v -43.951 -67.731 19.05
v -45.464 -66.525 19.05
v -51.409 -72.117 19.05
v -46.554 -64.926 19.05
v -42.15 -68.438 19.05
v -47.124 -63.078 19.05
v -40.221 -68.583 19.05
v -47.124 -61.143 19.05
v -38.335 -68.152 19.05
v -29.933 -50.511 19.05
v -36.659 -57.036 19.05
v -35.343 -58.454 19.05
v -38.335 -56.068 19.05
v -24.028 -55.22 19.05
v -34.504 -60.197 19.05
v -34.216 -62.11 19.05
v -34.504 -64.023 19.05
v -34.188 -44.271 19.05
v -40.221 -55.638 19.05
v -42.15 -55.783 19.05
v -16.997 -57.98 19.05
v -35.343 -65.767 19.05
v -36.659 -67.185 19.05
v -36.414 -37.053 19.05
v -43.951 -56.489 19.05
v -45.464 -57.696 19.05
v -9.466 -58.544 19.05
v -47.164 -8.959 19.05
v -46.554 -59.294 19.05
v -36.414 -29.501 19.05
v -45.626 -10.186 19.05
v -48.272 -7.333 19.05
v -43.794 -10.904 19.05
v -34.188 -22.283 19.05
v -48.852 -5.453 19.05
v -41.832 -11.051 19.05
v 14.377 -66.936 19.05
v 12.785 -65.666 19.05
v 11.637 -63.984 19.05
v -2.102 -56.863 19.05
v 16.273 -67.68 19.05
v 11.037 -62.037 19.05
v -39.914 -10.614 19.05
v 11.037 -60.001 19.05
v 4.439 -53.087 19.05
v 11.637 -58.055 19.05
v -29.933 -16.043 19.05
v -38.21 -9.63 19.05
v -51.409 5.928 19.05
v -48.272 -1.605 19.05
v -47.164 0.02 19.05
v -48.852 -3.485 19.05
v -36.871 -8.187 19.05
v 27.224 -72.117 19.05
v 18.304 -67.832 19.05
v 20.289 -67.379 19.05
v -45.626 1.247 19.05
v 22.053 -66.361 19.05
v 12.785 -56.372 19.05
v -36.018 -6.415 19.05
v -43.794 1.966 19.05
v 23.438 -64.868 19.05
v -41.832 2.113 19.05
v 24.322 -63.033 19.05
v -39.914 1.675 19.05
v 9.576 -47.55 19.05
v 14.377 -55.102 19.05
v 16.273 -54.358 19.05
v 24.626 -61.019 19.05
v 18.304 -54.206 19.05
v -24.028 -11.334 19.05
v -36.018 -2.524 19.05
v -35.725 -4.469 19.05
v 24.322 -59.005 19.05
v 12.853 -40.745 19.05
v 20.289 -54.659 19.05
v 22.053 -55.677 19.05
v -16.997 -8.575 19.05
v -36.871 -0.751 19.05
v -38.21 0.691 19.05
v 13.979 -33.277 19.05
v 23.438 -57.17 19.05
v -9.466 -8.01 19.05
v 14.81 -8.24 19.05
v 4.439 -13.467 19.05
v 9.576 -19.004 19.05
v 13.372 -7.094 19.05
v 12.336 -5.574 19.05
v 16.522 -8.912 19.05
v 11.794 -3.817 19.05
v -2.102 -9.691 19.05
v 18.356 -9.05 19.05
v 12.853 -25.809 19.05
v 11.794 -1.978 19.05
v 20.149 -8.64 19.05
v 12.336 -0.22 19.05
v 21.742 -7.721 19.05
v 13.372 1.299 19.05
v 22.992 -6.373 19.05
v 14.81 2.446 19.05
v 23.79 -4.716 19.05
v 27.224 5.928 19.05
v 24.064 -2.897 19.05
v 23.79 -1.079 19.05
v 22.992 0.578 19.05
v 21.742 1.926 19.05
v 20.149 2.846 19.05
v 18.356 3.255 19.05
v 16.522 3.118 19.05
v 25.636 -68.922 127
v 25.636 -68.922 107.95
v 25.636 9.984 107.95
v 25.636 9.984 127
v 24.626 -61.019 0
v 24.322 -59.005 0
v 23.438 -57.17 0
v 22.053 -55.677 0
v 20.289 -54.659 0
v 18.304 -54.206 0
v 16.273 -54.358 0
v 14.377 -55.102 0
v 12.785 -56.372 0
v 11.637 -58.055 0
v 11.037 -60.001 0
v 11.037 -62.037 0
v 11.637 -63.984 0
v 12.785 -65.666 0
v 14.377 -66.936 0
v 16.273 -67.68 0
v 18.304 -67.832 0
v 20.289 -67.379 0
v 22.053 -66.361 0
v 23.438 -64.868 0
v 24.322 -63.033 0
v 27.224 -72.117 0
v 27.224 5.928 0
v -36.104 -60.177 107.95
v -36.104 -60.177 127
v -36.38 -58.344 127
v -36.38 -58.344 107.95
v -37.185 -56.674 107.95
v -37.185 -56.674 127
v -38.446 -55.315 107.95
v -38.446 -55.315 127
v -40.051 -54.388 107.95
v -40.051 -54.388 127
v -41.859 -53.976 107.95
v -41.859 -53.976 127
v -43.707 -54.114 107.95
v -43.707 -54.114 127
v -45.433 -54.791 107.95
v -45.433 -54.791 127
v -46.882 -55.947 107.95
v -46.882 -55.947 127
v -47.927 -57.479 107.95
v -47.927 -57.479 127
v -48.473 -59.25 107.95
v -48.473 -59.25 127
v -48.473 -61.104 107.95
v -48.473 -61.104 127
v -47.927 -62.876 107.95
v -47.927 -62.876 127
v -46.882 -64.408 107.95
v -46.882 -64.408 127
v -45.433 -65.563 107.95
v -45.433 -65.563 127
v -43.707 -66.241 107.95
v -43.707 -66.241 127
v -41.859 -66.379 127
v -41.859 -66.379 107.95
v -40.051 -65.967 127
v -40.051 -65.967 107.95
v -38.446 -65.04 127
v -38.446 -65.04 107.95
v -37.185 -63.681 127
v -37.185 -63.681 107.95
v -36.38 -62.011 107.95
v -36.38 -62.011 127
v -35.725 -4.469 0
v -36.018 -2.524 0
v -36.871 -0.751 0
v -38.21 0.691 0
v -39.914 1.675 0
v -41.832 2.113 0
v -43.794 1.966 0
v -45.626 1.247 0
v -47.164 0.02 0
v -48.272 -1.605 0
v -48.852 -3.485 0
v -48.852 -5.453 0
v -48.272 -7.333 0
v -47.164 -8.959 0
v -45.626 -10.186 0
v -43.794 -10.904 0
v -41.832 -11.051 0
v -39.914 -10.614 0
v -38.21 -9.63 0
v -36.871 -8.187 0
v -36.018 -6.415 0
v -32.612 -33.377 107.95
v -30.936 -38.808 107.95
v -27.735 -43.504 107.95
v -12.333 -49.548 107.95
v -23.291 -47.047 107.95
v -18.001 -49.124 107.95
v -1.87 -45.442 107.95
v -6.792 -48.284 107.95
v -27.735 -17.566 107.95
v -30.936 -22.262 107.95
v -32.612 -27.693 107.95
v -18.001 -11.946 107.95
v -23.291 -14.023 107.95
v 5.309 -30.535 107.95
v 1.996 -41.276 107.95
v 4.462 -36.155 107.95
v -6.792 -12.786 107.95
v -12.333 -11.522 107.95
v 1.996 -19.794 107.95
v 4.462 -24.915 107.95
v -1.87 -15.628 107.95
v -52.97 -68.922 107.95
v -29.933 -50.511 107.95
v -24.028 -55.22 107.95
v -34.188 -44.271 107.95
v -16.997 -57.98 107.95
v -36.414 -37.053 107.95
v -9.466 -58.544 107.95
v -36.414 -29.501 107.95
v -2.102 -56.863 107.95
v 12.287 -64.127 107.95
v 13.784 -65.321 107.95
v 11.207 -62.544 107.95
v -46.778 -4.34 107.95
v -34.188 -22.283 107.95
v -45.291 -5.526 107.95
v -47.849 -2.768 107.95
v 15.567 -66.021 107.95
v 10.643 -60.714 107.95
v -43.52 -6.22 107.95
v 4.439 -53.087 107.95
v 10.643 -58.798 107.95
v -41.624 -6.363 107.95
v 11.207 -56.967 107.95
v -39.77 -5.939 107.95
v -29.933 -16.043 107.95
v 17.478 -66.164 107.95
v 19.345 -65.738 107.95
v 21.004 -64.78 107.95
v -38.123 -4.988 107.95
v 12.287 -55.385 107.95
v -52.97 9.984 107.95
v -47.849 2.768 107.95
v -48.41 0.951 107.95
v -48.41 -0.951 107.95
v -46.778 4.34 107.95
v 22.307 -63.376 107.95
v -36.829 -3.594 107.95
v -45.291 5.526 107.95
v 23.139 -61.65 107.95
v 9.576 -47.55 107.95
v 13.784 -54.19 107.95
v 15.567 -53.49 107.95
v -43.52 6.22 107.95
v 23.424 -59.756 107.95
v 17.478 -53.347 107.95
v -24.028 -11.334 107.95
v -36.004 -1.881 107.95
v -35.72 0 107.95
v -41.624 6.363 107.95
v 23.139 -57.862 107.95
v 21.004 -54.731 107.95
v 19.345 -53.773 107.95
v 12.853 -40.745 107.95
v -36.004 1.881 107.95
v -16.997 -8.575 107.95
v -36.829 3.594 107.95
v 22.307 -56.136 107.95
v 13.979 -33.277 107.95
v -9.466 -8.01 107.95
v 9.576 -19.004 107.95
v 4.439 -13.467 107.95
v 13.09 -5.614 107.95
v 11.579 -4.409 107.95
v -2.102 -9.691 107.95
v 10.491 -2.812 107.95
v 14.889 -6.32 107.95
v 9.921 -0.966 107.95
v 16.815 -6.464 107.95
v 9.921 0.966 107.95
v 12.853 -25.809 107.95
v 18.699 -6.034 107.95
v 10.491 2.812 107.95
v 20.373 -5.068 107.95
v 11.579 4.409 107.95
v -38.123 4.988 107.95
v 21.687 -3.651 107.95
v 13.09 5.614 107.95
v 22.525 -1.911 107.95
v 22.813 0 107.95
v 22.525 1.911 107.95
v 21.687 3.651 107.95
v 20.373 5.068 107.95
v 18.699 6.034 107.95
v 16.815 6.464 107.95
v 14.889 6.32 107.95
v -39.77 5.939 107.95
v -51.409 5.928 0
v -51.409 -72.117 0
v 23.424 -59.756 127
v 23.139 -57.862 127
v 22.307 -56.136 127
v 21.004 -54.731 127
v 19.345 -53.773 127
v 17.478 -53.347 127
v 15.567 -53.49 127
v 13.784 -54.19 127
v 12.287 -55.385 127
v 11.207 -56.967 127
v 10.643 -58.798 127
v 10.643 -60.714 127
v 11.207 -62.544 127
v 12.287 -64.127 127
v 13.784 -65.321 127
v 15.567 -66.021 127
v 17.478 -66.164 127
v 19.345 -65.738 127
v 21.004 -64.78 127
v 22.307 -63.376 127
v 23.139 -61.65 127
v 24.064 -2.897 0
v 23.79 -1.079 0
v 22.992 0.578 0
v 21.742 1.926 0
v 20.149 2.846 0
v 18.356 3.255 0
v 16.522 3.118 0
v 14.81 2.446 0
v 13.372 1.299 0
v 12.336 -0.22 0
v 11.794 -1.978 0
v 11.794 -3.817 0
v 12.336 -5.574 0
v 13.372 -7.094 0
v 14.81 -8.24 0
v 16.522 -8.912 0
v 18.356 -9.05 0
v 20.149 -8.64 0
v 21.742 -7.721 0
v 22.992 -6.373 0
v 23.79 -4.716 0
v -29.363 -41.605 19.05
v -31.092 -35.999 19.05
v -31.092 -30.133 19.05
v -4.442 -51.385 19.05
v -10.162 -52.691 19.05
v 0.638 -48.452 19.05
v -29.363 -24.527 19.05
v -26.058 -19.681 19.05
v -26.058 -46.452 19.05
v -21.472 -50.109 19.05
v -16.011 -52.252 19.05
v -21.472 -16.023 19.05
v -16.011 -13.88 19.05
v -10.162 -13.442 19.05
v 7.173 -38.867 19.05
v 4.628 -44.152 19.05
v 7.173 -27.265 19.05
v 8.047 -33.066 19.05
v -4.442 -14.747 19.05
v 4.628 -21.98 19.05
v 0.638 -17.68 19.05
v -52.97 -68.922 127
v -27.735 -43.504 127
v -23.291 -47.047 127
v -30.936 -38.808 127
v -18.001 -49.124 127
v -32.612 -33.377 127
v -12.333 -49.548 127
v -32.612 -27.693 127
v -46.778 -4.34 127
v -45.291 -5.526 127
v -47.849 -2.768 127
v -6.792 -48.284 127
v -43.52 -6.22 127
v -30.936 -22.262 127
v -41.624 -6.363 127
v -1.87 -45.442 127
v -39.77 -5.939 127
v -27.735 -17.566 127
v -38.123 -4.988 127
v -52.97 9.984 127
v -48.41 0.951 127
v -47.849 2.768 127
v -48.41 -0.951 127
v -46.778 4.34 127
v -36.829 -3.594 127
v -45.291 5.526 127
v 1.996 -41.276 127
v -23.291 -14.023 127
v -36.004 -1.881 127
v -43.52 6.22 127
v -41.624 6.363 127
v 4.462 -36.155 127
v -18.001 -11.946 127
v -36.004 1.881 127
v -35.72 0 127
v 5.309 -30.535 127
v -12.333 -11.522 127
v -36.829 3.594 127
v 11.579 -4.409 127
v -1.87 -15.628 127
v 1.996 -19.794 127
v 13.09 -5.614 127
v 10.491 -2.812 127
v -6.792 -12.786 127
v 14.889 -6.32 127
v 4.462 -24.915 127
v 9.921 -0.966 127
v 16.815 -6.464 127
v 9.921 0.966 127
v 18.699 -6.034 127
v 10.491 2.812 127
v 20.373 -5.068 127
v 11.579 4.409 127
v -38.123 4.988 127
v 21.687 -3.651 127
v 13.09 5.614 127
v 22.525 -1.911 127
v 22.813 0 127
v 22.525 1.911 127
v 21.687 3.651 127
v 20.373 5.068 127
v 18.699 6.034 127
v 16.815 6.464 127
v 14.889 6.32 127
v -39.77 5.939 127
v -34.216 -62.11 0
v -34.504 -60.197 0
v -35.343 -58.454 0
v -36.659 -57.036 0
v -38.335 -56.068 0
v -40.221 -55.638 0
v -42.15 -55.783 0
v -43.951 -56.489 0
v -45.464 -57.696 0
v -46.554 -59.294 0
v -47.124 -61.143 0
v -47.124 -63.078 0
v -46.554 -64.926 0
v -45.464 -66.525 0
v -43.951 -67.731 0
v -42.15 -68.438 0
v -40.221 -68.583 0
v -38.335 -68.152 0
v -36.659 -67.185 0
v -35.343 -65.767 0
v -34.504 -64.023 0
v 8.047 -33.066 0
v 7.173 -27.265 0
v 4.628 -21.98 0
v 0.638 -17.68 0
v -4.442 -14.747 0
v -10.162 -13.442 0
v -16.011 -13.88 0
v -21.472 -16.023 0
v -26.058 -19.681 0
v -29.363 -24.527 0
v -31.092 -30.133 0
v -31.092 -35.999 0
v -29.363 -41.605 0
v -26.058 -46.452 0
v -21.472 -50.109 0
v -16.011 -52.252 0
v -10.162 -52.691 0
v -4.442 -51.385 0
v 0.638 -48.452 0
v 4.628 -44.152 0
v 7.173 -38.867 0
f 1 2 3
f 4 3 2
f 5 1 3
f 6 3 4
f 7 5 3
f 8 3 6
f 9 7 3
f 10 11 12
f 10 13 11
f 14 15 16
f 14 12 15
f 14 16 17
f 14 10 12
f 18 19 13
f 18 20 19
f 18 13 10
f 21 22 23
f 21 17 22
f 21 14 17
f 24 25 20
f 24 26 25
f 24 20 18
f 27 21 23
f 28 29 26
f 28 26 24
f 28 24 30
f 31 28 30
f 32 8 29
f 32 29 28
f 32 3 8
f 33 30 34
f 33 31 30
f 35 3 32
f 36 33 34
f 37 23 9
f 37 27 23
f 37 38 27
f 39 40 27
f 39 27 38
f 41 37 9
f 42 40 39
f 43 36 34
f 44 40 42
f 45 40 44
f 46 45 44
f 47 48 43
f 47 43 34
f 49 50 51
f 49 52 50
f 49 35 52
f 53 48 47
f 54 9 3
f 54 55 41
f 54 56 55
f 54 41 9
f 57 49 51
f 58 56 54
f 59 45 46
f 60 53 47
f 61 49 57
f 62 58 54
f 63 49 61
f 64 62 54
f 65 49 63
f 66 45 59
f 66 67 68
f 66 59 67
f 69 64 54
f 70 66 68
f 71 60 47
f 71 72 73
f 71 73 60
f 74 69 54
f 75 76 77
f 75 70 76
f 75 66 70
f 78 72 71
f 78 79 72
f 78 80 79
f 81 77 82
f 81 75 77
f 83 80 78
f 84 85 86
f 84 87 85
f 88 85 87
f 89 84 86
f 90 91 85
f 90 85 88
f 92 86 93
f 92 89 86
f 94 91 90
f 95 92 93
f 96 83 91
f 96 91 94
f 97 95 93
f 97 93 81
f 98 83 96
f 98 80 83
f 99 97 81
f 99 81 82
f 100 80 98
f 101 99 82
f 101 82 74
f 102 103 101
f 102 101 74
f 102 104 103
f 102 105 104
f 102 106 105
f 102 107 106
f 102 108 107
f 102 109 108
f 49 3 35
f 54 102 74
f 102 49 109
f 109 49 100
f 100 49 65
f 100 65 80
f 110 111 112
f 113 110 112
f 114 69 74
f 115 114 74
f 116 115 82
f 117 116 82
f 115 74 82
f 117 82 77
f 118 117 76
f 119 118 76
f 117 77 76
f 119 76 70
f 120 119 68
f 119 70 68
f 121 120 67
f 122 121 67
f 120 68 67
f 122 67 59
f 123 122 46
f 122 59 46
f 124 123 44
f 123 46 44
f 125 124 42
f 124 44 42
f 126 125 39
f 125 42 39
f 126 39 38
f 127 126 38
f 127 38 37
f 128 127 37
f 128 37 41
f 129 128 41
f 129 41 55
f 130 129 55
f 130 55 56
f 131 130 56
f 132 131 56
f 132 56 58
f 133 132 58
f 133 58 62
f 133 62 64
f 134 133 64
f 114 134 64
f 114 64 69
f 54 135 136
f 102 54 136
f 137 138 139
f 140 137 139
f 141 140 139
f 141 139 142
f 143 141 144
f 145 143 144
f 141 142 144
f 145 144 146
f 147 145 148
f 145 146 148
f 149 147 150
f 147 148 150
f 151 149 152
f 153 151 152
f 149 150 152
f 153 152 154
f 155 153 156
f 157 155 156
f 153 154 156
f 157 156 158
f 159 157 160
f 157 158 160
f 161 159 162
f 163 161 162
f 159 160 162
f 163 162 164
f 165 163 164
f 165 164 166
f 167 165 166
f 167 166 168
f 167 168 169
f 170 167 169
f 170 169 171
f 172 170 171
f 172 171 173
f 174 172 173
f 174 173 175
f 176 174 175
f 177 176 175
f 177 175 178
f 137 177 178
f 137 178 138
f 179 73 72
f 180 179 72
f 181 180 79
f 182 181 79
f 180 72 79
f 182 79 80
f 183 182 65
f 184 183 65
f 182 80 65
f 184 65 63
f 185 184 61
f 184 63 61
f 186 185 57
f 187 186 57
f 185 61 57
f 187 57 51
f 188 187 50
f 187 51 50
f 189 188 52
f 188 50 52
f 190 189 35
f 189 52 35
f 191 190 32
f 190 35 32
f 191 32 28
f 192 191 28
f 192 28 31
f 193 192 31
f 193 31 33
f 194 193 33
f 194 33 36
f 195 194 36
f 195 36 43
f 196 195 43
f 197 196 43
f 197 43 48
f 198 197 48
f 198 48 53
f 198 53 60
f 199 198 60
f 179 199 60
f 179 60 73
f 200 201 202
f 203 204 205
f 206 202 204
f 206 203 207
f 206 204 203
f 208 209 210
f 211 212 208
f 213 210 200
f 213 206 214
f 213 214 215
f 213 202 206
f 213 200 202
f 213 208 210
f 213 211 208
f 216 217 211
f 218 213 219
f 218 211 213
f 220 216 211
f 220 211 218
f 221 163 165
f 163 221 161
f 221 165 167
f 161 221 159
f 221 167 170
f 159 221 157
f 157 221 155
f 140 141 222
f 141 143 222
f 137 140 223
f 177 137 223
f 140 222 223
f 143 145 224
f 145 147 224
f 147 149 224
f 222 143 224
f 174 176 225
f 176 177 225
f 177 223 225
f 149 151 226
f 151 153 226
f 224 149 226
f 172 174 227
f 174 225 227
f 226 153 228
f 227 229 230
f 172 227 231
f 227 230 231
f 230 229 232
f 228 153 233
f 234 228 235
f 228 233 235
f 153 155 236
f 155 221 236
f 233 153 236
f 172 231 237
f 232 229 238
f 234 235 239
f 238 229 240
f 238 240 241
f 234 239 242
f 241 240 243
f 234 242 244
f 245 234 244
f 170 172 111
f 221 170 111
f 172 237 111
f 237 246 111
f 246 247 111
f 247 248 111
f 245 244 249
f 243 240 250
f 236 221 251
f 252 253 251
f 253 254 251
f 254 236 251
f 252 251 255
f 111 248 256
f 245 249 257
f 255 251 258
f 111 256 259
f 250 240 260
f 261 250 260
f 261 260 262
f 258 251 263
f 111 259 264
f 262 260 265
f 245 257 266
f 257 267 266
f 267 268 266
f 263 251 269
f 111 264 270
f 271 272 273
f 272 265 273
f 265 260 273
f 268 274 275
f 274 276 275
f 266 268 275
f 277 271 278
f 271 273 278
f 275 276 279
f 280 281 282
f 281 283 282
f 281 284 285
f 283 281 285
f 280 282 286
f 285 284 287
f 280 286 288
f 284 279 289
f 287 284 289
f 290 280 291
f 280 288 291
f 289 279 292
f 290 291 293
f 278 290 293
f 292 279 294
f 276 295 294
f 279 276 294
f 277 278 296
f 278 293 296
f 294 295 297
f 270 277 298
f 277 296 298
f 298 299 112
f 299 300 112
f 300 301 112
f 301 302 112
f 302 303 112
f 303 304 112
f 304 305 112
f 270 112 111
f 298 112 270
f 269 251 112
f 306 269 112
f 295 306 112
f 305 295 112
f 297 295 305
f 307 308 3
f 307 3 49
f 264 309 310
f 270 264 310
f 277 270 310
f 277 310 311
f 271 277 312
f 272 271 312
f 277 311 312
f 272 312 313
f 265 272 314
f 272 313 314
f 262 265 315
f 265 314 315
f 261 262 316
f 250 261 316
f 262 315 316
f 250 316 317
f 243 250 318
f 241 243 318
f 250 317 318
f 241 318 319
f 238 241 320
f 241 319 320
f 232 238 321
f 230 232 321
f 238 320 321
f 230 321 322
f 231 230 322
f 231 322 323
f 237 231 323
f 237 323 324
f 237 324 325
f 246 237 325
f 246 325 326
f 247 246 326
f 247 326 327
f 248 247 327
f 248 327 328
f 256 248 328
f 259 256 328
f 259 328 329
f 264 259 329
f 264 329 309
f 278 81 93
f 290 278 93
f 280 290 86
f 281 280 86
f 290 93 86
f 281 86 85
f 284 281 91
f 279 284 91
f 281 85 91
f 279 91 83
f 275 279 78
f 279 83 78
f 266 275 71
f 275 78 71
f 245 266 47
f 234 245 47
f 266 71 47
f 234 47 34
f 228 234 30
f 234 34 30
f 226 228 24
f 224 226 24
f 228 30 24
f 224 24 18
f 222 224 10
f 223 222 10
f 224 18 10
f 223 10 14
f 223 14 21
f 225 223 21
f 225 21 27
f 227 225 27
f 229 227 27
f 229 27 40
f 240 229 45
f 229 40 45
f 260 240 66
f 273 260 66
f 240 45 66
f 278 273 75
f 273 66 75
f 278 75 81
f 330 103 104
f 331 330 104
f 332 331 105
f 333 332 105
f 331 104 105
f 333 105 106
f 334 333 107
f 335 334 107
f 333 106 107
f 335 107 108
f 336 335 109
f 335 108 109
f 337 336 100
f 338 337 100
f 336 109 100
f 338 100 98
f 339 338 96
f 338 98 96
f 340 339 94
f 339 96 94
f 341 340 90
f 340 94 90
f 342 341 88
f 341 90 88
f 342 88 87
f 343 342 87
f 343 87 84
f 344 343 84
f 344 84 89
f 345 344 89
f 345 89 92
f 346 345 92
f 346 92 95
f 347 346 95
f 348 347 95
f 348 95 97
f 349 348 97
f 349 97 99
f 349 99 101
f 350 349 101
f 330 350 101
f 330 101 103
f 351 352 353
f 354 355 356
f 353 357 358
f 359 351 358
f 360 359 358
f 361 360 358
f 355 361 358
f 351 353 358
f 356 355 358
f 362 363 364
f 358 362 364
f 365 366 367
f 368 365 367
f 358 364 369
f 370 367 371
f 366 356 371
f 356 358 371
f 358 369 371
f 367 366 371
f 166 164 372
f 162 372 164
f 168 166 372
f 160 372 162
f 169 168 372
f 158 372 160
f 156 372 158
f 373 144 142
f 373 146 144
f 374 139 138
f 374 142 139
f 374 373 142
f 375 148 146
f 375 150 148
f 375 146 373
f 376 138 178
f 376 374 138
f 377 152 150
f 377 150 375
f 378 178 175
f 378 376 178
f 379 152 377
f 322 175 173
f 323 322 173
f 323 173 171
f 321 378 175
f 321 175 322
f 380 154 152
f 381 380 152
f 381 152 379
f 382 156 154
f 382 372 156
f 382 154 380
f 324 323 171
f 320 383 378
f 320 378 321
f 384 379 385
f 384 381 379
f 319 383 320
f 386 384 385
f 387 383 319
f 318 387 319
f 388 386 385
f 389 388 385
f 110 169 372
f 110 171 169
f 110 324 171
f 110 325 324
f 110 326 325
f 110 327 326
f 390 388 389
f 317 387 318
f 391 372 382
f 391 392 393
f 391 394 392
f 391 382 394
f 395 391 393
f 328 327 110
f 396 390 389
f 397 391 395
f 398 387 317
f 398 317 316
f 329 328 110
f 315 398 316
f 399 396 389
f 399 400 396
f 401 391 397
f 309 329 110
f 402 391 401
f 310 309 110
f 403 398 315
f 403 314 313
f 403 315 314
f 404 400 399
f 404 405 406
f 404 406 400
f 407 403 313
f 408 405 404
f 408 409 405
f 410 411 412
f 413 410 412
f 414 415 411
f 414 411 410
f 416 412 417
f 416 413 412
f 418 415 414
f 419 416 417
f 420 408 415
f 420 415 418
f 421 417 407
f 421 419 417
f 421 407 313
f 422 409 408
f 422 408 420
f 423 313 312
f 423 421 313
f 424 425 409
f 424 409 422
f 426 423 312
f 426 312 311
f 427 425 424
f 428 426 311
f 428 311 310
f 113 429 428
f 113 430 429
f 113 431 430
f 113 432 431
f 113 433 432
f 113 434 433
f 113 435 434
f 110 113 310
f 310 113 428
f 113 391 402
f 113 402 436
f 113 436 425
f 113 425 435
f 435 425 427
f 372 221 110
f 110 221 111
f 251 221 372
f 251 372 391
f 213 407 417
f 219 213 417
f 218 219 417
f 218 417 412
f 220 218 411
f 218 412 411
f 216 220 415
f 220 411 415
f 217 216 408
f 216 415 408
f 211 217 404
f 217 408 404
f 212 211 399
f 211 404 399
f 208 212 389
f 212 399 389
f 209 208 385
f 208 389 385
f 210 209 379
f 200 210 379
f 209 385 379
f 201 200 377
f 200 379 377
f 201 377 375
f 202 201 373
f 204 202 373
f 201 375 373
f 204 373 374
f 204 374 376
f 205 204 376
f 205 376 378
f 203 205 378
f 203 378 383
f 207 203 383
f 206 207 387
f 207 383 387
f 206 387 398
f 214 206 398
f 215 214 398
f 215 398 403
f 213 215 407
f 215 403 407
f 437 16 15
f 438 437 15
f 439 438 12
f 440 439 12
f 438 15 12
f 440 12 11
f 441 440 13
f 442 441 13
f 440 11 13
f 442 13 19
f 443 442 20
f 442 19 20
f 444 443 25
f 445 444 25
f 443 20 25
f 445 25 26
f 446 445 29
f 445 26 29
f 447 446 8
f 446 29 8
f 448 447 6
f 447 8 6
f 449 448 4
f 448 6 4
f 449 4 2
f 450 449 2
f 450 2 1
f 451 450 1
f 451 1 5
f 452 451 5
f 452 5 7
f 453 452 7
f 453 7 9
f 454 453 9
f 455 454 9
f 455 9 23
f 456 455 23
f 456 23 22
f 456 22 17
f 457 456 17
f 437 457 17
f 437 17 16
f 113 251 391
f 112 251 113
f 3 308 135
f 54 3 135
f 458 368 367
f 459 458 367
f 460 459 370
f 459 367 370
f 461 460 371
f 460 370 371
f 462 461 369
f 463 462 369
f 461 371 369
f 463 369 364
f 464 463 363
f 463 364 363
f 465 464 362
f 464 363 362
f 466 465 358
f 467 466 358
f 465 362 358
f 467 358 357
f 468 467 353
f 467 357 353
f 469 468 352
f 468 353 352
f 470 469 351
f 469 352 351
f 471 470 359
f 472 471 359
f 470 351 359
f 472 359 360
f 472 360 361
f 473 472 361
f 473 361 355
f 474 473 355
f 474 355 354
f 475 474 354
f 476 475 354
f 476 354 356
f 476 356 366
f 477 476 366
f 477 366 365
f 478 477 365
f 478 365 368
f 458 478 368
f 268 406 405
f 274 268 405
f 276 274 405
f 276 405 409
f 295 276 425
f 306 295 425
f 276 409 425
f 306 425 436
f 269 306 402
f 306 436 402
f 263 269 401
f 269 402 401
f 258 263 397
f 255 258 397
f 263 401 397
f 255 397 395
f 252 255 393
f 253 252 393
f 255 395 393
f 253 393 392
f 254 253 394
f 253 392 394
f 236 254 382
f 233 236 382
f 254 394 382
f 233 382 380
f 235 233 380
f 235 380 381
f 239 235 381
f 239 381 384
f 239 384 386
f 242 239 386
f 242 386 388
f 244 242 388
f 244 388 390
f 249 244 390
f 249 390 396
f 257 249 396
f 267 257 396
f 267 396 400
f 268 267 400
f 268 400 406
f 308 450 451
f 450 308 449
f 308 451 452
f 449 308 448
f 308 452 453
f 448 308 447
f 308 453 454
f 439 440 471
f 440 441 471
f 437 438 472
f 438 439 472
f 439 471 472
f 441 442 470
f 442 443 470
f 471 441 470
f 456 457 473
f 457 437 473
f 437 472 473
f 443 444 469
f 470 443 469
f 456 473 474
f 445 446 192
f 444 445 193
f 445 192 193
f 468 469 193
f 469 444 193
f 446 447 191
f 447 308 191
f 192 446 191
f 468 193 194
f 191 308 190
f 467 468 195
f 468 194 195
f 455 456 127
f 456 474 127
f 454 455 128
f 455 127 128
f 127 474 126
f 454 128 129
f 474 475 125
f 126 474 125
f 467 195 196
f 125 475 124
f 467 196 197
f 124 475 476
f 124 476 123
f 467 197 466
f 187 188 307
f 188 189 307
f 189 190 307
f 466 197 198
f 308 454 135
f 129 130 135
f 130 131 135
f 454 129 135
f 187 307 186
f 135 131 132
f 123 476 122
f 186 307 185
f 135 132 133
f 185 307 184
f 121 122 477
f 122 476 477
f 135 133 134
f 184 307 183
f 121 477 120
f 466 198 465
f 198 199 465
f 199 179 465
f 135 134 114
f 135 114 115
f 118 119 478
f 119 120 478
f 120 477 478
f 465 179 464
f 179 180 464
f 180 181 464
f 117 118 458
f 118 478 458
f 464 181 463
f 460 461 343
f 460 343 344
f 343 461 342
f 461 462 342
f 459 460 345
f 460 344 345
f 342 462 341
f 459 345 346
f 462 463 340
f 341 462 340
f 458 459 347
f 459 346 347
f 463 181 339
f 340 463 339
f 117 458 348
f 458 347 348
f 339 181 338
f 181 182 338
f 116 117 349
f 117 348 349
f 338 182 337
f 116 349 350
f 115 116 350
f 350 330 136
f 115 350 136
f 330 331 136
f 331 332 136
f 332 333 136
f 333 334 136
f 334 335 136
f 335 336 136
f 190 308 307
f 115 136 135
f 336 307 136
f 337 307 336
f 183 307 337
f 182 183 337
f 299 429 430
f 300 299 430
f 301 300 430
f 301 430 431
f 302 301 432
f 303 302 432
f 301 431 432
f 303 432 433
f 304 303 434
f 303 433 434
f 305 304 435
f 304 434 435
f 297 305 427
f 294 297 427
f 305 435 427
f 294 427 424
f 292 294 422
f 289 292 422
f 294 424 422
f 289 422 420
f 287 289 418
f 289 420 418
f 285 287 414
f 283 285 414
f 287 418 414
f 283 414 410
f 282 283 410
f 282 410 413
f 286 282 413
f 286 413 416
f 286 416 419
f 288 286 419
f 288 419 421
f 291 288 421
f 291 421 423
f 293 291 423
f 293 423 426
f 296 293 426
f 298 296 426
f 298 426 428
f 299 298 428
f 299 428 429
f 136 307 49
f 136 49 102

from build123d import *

# Parameters (mm, degrees)
F0_W      = 78.632404
F0_H      = 78.044064
F1_DEPTH  = 19.05
F7_R      = 19.67966
F8_DEPTH  = 25.4
F9_R      = 25.337788
F10_DEPTH = 88.9
F11_W     = 78.605324
F11_H     = 78.906078
F12_DEPTH = 19.05
F13_R     = 19.066656
F14_DEPTH = 19.05
F6_R      = 6.832472
F15_DEPTH = 304.8
F4_R      = 6.169539
F16_DEPTH = 25.4
F3_R      = 6.600699
F17_DEPTH = 25.4
F5_R      = 6.490494
F18_DEPTH = 25.4
F19_R     = 6.482052
F19_R_2   = 6.426585
F19_R_3   = 6.219267
F19_R_4   = 6.38041
F20_DEPTH = 25.4


with BuildPart() as f1:
    # F0 (on Top) → F1 (new body)
    with BuildSketch(Plane.XY):
        with Locations((-12.092622, -33.094514)):
            Rectangle(F0_W, F0_H)
    extrude(amount=F1_DEPTH)

    # F7 (on face) → F8 (cut)
    with BuildSketch(Plane.XY.offset(19.05)):
        with Locations((-11.63225, -33.066146)):
            Circle(F7_R)
    extrude(amount=-F8_DEPTH, mode=Mode.SUBTRACT)

    # F9 (on face) → F10 (join)
    with BuildSketch(Plane.XY.offset(19.05)):
        with Locations((-11.359275, -33.27705)):
            Circle(F9_R)
    extrude(amount=F10_DEPTH)

    # F11 (on face) → F12 (join)
    with BuildSketch(Plane.XY.offset(107.95)):
        with Locations((-13.666842, -29.469063)):
            Rectangle(F11_W, F11_H)
    extrude(amount=F12_DEPTH)

    # F13 (on face) → F14 (cut)
    with BuildSketch(Plane.XY.offset(127)):
        with Locations((-13.757879, -30.534975)):
            Circle(F13_R)
    extrude(amount=-F14_DEPTH, mode=Mode.SUBTRACT)

    # F6 (on face) → F15 (cut)
    with BuildSketch(Plane.XY.offset(19.05)):
        with Locations((17.793169, -61.01913)):
            Circle(F6_R)
    extrude(amount=-F15_DEPTH, mode=Mode.SUBTRACT)

    # F4 (on face) → F16 (cut)
    with BuildSketch(Plane.XY.offset(19.05)):
        with Locations((17.894953, -2.897272)):
            Circle(F4_R)
    extrude(amount=-F16_DEPTH, mode=Mode.SUBTRACT)

    # F3 (on face) → F17 (cut)
    with BuildSketch(Plane.XY.offset(19.05)):
        with Locations((-42.325243, -4.469179)):
            Circle(F3_R)
    extrude(amount=-F17_DEPTH, mode=Mode.SUBTRACT)

    # F5 (on face) → F18 (cut)
    with BuildSketch(Plane.XY.offset(19.05)):
        with Locations((-40.706113, -62.110294)):
            Circle(F5_R)
    extrude(amount=-F18_DEPTH, mode=Mode.SUBTRACT)

    # F19 (on face) → F20 (cut)
    with BuildSketch(Plane.XY.offset(127)):
        with Locations((16.331086, 0)):
            Circle(F19_R)
        with Locations((16.997535, -59.755784)):
            Circle(F19_R_2)
        with Locations((-42.323295, -60.177404)):
            Circle(F19_R_3)
        with Locations((-42.10072, 0)):
            Circle(F19_R_4)
    extrude(amount=-F20_DEPTH, mode=Mode.SUBTRACT)


solid = f1.part
